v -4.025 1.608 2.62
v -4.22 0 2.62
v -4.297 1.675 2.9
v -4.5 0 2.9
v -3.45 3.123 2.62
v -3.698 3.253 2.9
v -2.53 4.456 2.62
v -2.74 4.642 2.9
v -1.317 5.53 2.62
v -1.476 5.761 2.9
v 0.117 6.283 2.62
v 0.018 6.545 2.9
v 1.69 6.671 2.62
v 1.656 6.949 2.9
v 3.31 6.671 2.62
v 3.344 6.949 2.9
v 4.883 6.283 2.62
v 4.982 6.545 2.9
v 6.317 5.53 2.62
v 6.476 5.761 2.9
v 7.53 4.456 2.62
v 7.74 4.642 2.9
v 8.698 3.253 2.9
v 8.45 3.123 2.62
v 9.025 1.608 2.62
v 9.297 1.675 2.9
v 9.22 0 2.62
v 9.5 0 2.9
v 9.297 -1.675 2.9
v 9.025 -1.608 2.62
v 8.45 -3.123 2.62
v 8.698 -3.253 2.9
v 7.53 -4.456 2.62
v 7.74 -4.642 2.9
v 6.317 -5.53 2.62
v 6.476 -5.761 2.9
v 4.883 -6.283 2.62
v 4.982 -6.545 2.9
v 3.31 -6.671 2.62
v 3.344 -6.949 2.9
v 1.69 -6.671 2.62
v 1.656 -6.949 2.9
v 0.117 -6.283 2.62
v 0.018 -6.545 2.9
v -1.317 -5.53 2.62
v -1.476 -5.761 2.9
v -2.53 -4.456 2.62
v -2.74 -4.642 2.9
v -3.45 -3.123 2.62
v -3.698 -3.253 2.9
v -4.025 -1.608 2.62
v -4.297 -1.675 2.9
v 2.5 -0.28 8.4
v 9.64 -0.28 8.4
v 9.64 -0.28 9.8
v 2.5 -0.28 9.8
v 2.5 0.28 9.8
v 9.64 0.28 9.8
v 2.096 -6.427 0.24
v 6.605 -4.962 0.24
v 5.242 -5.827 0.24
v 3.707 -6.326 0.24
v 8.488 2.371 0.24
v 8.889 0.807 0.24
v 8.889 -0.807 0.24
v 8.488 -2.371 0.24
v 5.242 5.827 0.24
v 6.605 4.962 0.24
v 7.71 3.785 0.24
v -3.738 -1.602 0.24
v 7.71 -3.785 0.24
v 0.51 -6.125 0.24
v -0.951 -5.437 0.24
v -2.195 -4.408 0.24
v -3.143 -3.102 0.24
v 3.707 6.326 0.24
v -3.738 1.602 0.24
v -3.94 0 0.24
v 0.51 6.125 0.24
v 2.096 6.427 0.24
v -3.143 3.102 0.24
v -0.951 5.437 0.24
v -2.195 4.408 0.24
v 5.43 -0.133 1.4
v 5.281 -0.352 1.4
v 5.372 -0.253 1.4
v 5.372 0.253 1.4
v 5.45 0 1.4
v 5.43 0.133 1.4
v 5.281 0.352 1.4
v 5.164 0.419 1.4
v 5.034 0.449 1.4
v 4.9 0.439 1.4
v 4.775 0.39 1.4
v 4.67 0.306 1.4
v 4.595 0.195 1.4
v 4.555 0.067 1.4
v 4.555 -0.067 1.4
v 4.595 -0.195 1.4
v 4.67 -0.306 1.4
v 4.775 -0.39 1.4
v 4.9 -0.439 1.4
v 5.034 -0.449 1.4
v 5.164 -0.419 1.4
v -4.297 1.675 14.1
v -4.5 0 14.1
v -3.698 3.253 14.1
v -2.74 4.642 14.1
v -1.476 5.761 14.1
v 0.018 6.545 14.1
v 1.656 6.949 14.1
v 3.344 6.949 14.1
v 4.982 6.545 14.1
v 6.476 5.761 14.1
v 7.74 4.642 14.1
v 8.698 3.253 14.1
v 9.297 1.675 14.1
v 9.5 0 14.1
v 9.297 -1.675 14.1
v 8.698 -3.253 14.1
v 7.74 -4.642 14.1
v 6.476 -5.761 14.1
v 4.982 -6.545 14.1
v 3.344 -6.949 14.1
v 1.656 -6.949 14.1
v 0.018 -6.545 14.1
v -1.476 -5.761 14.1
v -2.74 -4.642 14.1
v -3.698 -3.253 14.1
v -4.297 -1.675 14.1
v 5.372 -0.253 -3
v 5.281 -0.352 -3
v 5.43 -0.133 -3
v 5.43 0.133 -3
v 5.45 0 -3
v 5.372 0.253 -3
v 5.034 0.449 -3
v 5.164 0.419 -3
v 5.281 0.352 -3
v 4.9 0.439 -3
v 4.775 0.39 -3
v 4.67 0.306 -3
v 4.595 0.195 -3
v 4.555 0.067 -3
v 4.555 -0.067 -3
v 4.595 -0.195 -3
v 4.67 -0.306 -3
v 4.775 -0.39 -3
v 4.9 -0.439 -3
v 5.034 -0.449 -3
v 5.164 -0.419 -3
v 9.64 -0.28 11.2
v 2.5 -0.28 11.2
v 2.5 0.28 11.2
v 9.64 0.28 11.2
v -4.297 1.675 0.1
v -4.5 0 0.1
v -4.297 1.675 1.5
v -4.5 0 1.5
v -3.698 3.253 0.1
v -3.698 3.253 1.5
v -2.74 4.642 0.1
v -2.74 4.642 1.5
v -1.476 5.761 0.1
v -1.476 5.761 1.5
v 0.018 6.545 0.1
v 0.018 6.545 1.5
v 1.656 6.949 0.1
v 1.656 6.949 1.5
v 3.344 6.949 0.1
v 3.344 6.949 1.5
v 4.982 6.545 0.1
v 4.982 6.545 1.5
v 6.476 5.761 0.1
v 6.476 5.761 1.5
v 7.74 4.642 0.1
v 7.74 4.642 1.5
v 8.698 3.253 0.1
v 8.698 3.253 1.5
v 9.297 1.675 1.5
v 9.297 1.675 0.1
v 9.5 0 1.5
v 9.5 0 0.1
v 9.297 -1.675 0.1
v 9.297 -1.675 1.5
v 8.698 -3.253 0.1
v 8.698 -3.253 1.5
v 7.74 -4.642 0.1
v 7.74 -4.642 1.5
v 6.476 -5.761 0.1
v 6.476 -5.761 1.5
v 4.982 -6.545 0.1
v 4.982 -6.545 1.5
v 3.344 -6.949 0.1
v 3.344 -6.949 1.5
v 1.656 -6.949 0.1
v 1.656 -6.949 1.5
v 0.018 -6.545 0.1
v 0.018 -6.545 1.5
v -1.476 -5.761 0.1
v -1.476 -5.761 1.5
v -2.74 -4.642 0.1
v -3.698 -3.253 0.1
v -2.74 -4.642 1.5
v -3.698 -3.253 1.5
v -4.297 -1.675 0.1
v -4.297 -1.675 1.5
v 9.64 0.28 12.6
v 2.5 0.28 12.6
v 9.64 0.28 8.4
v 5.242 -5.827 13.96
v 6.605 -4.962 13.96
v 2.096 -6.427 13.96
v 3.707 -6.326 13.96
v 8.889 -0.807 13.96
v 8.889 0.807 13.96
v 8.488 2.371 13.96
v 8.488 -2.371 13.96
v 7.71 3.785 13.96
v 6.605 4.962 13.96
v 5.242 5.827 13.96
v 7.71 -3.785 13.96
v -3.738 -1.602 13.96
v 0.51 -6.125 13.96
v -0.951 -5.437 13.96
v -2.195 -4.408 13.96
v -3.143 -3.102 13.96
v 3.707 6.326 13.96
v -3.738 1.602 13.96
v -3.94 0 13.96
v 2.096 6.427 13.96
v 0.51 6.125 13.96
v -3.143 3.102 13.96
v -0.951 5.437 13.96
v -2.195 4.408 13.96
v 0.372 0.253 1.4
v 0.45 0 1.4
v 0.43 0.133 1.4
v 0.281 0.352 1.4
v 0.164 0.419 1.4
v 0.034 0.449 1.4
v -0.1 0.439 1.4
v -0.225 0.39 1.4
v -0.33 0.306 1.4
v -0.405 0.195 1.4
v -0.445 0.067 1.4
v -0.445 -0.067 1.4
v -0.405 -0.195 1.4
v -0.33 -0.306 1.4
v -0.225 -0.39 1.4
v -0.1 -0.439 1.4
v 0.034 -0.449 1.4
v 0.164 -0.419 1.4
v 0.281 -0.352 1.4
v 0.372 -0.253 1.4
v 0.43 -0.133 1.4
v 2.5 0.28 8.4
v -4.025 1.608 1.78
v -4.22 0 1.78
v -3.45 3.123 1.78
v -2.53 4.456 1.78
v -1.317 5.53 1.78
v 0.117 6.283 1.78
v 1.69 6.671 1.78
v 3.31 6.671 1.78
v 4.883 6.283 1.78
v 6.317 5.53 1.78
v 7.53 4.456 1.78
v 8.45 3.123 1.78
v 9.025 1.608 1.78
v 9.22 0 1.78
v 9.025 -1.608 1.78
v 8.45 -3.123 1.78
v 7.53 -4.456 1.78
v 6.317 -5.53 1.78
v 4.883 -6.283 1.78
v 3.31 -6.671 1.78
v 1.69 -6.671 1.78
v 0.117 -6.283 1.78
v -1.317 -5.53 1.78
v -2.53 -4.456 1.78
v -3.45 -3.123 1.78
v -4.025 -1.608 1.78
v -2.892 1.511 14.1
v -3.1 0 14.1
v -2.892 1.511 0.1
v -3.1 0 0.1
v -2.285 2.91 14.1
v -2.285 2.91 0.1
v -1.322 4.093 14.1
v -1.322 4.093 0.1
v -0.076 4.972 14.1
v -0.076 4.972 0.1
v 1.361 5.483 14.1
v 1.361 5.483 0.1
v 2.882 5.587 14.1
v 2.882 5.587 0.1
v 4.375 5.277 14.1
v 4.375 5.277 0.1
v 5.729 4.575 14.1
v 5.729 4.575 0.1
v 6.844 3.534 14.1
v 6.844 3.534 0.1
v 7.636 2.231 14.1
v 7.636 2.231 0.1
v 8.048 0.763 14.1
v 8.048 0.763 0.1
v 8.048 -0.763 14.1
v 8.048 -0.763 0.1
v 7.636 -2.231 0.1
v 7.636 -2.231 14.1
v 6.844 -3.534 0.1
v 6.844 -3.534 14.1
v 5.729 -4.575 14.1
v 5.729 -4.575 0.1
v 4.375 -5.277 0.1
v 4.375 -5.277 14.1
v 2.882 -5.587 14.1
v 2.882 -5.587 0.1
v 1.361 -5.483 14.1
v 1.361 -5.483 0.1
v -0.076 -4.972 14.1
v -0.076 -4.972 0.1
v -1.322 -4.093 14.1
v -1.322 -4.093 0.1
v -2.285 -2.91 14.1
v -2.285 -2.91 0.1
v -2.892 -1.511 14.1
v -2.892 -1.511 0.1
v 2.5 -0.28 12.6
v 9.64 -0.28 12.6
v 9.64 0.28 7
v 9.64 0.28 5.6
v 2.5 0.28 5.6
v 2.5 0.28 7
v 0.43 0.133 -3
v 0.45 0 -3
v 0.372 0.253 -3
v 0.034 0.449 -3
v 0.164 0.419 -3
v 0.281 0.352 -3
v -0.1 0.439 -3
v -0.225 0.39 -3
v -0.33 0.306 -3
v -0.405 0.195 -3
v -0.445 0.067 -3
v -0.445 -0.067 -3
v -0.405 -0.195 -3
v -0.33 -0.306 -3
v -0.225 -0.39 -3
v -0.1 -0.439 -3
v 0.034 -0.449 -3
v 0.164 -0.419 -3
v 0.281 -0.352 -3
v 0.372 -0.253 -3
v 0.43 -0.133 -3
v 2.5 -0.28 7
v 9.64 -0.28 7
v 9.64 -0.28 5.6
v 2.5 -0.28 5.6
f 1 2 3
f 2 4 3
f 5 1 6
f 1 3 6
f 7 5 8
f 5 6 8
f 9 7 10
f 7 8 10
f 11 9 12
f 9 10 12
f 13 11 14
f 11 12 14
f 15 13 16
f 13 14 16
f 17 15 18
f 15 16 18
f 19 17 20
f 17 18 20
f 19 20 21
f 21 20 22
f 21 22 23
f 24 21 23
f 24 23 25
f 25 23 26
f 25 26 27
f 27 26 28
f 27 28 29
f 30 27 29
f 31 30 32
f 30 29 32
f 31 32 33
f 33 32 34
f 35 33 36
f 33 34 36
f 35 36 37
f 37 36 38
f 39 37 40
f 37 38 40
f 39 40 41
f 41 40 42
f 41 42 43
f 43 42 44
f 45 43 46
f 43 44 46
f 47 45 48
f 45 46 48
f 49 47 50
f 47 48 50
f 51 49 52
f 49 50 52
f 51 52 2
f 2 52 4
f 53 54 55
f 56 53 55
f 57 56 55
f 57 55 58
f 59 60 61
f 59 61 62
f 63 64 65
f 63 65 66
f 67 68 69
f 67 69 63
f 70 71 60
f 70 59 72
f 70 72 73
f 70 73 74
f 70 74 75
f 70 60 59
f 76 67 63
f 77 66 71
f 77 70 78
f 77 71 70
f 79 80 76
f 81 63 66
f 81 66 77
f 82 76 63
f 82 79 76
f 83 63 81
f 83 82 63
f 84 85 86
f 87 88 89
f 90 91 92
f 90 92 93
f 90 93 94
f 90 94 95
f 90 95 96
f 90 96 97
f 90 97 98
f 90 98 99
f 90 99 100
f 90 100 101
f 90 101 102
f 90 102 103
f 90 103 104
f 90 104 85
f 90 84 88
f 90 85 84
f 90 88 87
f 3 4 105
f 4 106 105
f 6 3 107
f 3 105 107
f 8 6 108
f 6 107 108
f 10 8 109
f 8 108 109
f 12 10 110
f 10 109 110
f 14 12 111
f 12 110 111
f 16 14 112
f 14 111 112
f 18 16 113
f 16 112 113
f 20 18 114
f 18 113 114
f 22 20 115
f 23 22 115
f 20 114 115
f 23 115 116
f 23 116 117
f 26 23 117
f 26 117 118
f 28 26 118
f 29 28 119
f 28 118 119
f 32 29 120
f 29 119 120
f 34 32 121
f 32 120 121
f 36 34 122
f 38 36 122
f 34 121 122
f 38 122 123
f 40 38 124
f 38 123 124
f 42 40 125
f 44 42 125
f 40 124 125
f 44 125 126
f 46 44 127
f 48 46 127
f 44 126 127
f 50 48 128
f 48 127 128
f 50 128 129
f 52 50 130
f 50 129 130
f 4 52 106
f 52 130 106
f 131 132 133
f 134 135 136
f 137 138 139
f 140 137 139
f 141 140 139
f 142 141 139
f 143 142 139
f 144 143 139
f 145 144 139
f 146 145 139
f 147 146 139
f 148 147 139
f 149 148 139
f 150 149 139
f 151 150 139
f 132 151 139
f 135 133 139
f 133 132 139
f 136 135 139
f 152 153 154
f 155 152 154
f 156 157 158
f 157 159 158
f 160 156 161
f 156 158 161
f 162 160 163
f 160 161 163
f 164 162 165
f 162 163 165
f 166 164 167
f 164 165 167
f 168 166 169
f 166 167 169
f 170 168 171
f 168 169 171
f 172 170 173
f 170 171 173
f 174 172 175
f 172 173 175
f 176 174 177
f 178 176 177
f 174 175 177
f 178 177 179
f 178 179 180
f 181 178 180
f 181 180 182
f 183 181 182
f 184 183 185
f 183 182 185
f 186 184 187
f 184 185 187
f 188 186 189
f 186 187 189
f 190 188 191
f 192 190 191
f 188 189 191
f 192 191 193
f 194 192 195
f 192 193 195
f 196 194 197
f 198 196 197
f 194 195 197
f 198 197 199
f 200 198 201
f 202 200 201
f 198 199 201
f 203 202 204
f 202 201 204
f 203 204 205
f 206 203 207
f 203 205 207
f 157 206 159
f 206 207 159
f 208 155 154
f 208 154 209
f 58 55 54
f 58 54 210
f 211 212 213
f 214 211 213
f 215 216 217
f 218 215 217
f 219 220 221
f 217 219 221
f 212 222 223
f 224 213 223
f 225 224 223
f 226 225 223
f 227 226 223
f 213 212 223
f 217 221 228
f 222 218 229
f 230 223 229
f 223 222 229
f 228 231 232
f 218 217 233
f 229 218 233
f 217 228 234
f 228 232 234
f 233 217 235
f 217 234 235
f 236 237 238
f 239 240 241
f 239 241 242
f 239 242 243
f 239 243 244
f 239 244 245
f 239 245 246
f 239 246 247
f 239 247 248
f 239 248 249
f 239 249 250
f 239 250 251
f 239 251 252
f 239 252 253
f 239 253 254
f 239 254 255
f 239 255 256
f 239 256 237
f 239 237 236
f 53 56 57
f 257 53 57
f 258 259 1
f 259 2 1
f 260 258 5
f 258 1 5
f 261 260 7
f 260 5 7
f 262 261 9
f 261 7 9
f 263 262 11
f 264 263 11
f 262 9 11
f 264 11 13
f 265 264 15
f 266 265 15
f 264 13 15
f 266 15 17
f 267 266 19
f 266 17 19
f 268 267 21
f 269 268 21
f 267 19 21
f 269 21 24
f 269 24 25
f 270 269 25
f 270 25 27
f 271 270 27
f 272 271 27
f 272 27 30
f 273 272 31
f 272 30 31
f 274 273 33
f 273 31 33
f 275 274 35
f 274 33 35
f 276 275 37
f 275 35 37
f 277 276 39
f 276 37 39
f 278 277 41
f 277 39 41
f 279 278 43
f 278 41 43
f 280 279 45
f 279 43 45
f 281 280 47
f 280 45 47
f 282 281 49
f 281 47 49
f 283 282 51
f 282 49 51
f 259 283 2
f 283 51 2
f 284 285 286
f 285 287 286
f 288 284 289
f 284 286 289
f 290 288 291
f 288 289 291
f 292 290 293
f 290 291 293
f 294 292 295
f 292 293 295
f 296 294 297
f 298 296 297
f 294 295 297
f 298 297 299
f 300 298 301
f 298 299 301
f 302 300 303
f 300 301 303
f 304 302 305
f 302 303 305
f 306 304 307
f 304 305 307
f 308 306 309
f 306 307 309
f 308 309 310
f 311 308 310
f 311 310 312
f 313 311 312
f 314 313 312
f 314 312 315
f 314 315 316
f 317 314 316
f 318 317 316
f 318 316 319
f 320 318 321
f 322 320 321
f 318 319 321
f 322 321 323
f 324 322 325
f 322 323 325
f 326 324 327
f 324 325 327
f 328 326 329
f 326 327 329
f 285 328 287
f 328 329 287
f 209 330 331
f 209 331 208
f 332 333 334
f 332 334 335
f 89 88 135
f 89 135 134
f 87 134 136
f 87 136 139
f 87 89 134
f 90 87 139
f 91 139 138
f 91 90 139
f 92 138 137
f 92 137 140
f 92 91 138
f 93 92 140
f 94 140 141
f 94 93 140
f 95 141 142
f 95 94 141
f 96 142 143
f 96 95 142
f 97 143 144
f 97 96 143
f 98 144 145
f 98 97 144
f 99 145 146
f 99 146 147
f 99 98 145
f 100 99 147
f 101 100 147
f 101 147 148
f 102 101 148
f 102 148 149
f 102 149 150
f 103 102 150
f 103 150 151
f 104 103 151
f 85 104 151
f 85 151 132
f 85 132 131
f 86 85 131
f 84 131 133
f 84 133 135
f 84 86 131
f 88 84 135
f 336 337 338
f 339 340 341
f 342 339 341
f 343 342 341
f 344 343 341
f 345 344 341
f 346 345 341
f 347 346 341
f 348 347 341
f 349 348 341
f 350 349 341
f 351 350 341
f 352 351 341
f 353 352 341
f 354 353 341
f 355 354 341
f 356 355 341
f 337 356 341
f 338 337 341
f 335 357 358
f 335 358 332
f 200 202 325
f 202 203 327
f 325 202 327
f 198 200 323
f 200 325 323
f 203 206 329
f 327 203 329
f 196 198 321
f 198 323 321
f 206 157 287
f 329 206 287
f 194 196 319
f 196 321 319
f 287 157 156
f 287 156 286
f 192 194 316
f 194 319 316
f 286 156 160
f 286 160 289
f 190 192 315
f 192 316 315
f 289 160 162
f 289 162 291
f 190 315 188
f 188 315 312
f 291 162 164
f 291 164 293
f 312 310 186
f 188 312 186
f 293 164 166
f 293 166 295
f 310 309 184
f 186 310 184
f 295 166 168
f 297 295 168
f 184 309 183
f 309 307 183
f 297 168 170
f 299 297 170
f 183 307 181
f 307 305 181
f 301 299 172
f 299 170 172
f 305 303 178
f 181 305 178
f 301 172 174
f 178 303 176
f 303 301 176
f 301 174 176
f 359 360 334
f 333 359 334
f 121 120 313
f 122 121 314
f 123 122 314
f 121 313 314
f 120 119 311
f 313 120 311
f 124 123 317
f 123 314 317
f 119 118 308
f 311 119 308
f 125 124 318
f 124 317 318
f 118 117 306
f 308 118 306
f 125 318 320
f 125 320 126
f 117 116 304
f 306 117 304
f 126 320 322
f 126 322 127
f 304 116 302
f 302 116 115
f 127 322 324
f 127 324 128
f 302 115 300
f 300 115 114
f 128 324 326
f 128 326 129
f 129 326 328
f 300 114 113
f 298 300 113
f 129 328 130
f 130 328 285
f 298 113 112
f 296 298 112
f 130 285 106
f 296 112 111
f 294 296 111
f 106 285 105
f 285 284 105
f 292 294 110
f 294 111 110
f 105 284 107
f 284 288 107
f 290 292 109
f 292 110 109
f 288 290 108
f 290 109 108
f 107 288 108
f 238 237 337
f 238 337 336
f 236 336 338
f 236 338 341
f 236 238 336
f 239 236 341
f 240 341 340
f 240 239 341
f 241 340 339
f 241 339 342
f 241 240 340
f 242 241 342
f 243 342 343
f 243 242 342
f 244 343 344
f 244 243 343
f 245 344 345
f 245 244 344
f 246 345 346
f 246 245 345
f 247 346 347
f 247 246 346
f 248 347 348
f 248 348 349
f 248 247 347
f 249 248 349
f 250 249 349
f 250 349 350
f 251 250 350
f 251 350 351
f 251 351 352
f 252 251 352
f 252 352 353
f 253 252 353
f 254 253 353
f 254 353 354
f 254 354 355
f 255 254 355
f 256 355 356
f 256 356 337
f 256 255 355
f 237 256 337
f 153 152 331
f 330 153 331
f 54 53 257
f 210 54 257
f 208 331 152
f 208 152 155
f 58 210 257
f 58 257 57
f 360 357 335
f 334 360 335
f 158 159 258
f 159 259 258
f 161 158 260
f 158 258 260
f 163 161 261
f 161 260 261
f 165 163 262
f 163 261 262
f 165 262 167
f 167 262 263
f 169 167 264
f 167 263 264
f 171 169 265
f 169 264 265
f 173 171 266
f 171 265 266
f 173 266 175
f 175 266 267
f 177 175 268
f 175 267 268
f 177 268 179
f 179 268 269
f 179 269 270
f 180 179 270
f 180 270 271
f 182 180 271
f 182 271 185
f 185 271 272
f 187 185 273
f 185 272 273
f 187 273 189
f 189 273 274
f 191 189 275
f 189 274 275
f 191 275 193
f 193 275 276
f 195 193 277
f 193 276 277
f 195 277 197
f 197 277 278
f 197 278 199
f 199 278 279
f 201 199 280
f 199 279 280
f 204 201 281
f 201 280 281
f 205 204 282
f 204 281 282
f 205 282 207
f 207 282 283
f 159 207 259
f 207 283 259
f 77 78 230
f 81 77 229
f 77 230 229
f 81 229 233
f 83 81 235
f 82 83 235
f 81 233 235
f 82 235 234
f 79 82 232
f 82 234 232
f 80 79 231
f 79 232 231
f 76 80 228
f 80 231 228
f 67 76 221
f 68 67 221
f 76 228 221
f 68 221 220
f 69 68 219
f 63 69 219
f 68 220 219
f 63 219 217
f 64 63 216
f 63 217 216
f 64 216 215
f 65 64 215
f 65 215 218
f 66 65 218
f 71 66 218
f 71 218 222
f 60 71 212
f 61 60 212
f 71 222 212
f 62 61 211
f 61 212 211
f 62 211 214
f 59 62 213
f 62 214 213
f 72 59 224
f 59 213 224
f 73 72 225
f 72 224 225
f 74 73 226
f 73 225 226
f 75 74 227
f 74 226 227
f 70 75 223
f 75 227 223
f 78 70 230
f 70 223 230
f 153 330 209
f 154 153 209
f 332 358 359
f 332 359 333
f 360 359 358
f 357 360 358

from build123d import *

# Parameters (mm, degrees)
SKETCH002_W  = 6.44
SKETCH002_H  = 13.72
SKETCH003_R  = 0.45
PAD_DEPTH    = 4.4
SKETCH004_W  = 0.56
SKETCH004_H  = 1.4
PAD001_DEPTH = 7.14


with BuildPart() as revolution:
    # Sketch → Revolution (revolve)
    with BuildSketch(Plane.XZ):
        Polygon((-4.5, 0.1), (-4.5, 1.5), (-4.22, 1.78), (-4.22, 2.62), (-4.5, 2.9), (-4.5, 14.1), (-3.1, 14.1), (-3.1, 0.1), align=None)
    revolve(axis=Axis((2.5, 0, 7.548619), (0, 0, -1)))


with BuildPart() as revolution001:
    # Sketch002 → Revolution001 (revolve)
    with BuildSketch(Plane.XZ):
        with Locations((-0.72, 7.1)):
            Rectangle(SKETCH002_W, SKETCH002_H)
    revolve(axis=Axis((2.5, 0, 4.680116), (0, 0, -1)))


with BuildPart() as pad:
    # Sketch003 → Pad (new body)
    with BuildSketch(Plane.XY.offset(1.4)):
        Circle(SKETCH003_R)
        with Locations((5, 0)):
            Circle(SKETCH003_R)
    extrude(amount=-PAD_DEPTH)


with BuildPart() as pad001:
    # Sketch004 → Pad001 (new body)
    with BuildSketch(Plane.YZ.offset(2.5)):
        with Locations((0, 6.3)):
            Rectangle(SKETCH004_W, SKETCH004_H)
        with Locations((0, 9.1)):
            Rectangle(SKETCH004_W, SKETCH004_H)
        with Locations((0, 11.9)):
            Rectangle(SKETCH004_W, SKETCH004_H)
    extrude(amount=PAD001_DEPTH)


solid = Compound([revolution.part, revolution001.part, pad.part, pad001.part])
